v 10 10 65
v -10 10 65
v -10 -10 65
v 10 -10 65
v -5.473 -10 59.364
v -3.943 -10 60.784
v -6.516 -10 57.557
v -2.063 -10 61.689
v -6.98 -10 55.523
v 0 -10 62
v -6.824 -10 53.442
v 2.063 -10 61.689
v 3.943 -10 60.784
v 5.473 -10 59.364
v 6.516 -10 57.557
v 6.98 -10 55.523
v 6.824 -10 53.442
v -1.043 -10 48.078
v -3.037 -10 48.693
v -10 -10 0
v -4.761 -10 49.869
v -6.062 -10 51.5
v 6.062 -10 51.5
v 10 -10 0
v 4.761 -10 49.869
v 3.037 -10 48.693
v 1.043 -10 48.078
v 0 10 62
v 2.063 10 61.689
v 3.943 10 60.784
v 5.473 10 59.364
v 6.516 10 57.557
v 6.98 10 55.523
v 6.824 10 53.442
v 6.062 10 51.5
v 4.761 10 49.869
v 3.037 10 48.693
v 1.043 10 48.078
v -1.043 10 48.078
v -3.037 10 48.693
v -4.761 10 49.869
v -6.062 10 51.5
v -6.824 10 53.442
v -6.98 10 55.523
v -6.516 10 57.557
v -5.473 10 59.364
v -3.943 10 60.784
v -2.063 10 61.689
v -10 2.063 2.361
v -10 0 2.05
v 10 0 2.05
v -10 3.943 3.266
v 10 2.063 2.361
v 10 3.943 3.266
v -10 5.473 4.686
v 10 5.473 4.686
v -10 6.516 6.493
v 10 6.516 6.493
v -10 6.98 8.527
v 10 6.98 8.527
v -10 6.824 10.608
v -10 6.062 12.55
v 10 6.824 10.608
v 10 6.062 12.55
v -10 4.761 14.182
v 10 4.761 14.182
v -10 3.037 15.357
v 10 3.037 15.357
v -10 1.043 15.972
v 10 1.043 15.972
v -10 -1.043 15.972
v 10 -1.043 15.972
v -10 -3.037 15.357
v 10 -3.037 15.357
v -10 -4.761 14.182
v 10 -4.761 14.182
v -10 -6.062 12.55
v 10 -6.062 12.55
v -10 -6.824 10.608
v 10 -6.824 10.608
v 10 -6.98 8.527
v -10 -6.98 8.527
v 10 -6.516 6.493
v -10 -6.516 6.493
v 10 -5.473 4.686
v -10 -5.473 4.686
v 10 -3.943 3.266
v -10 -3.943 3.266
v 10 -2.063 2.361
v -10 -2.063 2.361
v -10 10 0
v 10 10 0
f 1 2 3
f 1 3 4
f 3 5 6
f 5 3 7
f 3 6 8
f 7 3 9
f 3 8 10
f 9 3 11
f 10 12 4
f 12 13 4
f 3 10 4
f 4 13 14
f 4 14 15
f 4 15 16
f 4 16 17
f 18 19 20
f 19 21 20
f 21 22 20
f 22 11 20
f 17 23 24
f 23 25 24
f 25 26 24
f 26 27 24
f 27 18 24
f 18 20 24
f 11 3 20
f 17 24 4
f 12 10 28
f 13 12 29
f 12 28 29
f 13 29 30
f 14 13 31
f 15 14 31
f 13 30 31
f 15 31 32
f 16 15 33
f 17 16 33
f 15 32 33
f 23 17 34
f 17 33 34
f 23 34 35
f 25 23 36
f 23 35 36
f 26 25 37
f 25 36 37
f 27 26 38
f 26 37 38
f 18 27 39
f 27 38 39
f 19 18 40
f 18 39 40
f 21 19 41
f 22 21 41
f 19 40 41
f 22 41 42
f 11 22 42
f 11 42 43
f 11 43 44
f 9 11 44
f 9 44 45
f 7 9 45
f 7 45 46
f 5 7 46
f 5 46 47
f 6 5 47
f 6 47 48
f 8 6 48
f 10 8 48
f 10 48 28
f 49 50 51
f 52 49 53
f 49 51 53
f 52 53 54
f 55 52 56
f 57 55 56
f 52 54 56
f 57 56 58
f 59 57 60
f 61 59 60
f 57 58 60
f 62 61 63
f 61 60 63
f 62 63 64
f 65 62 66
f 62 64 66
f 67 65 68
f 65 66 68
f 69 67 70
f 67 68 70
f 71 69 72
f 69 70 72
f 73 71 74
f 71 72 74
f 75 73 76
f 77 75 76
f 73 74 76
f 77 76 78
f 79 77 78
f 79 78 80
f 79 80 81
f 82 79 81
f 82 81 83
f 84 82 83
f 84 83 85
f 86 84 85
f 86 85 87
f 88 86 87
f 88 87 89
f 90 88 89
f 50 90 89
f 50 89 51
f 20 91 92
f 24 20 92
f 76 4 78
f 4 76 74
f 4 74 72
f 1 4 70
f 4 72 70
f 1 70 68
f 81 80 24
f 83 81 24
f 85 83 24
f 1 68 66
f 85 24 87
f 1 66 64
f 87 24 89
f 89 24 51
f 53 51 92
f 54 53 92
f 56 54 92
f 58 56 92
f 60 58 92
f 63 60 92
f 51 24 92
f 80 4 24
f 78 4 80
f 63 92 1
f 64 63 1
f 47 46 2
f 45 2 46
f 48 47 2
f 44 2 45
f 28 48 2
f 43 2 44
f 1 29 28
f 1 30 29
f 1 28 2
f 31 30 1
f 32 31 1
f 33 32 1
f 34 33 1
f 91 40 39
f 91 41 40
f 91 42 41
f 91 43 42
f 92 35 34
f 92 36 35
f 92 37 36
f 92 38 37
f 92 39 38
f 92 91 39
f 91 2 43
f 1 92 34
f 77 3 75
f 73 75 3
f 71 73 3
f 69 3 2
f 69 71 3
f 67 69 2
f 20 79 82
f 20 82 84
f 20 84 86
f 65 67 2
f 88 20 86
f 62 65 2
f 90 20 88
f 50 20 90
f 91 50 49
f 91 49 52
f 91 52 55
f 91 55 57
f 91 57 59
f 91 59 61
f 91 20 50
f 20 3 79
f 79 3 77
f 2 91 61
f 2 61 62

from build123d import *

# Parameters (mm, degrees)
SZKIC1_W                    = 20
SZKIC1_H                    = 20
DODANIE_WYCI_GNI_CIE1_DEPTH = 65
SZKIC2_R                    = 7
WYTNIJ_WYCI_GNI_CIE1_DEPTH  = 50
SZKIC3_R                    = 7
WYTNIJ_WYCI_GNI_CIE2_DEPTH  = 50


with BuildPart() as part:
    # Szkic1 → Dodanie-wyciągnięcie1 (new body)
    with BuildSketch(Plane.XY):
        Rectangle(SZKIC1_W, SZKIC1_H)
    extrude(amount=DODANIE_WYCI_GNI_CIE1_DEPTH)

    # Szkic2 → Wytnij-wyciągnięcie1 (cut)
    with BuildSketch(Plane(origin=(10, 0, 0), x_dir=(0, 0, -1), z_dir=(1, 0, 0))):
        with Locations((-9.050144452, 0)):
            Circle(SZKIC2_R)
    extrude(amount=-WYTNIJ_WYCI_GNI_CIE1_DEPTH, mode=Mode.SUBTRACT)

    # Szkic3 → Wytnij-wyciągnięcie2 (cut)
    with BuildSketch(Plane(origin=(0, 10, 0), x_dir=(1, 0, 0), z_dir=(0, 1, 0))):
        with Locations(Location((0, -55, 0), (0, 0, 270))):
            Circle(SZKIC3_R)
    extrude(amount=-WYTNIJ_WYCI_GNI_CIE2_DEPTH, mode=Mode.SUBTRACT)


solid = part.part
